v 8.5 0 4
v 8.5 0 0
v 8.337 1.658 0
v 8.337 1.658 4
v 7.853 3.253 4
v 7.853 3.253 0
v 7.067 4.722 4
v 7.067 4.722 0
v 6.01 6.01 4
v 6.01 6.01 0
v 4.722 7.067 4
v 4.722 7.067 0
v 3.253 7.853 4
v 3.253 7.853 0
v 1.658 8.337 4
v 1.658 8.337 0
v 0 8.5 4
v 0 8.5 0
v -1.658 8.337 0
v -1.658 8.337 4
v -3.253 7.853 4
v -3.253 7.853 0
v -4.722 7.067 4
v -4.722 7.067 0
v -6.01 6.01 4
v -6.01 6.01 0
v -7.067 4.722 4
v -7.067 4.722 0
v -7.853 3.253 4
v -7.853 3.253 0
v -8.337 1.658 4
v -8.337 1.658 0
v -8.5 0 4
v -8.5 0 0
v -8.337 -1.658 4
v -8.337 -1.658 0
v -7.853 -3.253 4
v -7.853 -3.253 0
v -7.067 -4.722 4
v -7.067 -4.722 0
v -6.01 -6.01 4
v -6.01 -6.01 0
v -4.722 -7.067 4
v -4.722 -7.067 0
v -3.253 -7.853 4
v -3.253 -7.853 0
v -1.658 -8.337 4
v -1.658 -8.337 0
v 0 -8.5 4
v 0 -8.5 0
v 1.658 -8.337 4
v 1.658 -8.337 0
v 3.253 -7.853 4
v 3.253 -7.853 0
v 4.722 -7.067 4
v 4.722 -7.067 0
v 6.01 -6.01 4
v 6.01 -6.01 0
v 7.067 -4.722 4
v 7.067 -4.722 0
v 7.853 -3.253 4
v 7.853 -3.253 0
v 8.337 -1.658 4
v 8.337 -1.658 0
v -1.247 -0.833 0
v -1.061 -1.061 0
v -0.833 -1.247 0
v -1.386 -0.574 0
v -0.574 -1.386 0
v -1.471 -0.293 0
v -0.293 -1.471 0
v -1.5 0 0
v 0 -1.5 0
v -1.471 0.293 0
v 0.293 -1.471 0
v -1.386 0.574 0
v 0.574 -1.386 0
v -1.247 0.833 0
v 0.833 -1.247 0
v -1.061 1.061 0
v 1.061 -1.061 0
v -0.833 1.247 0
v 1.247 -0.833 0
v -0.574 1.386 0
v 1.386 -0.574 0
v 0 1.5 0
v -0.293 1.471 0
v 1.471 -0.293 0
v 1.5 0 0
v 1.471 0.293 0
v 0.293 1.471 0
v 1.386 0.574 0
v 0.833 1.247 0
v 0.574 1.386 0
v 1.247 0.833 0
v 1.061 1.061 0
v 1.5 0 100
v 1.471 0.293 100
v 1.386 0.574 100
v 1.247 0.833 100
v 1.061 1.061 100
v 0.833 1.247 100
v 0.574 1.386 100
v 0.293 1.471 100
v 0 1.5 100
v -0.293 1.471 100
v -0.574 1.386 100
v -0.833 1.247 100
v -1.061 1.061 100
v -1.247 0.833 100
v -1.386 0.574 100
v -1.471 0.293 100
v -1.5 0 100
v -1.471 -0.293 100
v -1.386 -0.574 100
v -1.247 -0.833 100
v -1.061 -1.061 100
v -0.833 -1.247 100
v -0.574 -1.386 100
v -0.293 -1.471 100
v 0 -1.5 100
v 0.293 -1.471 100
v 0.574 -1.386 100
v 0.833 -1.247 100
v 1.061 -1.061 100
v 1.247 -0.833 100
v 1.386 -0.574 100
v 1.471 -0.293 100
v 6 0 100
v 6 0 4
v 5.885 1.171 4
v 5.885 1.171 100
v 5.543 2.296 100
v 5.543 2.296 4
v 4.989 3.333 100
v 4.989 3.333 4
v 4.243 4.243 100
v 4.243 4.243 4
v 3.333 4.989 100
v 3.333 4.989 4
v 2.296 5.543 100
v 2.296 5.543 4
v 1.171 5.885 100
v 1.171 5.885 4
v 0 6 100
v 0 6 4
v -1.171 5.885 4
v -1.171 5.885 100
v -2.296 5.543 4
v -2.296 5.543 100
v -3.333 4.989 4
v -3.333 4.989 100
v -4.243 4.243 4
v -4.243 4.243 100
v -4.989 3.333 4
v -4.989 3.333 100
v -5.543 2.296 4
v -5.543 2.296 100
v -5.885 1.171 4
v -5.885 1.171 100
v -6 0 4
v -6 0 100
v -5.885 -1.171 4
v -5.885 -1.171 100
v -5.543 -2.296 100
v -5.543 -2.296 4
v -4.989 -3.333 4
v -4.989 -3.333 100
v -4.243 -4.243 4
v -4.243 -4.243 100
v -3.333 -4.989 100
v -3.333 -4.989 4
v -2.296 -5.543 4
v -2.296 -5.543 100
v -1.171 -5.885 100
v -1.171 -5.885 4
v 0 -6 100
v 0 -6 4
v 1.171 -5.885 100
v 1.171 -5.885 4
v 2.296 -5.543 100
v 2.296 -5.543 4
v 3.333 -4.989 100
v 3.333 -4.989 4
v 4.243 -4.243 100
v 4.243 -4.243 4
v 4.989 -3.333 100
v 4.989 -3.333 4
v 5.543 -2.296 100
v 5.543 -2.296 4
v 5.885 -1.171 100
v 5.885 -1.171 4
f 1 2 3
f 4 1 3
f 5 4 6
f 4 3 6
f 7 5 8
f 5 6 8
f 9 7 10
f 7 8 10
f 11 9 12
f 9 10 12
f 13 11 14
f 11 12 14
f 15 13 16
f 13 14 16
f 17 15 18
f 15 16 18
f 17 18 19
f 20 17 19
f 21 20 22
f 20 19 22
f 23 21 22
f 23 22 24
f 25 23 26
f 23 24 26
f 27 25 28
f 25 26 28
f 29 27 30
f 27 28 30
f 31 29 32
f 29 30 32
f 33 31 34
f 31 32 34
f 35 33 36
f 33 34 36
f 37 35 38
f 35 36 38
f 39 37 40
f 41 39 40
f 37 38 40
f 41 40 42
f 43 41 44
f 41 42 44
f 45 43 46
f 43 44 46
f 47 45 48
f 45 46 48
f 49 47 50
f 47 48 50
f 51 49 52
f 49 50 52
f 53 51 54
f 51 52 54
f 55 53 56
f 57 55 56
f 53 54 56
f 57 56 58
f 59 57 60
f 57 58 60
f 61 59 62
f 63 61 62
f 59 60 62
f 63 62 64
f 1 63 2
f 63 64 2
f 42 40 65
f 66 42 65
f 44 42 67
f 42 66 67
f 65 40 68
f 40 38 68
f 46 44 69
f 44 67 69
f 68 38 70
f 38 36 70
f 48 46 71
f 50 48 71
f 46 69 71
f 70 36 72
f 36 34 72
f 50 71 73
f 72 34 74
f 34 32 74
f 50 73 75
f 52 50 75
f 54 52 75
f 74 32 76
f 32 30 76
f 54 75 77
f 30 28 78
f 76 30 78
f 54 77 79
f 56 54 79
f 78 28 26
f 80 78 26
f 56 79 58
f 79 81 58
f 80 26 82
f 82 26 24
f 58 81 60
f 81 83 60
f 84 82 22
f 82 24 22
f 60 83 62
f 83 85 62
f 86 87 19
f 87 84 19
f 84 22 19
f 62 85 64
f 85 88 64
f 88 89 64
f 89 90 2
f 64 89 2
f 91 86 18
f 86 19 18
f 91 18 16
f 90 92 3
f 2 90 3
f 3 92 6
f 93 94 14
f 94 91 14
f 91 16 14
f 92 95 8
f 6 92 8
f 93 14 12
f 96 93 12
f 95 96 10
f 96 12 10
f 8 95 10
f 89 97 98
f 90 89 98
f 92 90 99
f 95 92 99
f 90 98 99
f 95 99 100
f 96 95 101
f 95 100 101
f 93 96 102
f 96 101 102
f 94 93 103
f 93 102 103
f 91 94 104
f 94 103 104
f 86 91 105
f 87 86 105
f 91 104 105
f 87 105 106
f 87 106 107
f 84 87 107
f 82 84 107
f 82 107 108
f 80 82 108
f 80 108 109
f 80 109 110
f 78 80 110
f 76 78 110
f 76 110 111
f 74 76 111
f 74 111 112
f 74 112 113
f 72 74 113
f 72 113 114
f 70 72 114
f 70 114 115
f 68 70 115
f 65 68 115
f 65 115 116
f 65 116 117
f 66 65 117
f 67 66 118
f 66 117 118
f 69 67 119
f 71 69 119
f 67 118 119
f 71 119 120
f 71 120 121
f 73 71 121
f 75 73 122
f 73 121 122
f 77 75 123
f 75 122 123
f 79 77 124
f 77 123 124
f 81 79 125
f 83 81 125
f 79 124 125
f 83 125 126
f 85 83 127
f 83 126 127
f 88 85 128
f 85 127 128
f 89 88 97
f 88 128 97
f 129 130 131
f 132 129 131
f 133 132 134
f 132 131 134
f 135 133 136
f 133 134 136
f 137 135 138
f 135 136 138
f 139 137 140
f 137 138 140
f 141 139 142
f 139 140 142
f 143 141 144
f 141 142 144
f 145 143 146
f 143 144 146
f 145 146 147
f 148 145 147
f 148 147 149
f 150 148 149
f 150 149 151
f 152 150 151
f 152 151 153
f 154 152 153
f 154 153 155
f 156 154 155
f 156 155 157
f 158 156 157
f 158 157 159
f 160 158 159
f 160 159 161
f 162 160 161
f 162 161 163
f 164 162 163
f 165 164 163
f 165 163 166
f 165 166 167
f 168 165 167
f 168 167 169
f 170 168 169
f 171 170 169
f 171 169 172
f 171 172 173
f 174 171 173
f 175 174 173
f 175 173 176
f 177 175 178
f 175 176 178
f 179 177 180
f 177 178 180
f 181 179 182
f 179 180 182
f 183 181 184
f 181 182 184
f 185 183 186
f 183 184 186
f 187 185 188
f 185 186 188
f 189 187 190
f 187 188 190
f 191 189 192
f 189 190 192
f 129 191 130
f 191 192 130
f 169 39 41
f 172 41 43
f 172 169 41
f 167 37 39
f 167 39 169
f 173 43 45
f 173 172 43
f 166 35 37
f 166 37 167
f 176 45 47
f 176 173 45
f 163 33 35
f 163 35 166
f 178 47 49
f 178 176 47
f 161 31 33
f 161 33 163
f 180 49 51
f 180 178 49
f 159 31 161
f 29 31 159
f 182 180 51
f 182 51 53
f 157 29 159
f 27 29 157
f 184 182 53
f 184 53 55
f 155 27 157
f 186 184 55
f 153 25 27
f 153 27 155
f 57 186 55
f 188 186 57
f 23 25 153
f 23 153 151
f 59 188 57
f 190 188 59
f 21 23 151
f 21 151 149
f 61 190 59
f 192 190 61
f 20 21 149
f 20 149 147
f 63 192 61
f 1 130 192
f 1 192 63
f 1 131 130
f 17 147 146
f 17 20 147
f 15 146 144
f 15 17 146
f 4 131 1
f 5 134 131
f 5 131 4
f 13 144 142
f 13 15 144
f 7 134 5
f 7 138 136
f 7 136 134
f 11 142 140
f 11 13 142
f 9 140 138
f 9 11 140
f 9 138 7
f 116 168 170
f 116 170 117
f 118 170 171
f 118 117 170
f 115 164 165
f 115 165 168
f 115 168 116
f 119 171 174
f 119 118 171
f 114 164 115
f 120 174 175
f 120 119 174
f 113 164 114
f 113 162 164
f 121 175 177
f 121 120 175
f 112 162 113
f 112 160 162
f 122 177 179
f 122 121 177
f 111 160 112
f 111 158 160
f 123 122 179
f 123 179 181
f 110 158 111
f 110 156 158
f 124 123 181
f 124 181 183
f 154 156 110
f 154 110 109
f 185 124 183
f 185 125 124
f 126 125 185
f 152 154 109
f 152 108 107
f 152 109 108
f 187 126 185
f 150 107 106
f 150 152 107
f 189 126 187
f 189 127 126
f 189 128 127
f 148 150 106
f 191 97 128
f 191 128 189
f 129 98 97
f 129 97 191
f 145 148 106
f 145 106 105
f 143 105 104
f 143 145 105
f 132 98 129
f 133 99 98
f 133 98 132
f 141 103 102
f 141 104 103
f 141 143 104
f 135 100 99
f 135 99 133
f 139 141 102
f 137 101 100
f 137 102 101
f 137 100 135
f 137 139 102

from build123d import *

# Parameters (mm, degrees)
F0_R     = 8.5
F1_DEPTH = 4
F2_R     = 6
F3_DEPTH = 100
F4_R     = 1.5
F5_DEPTH = 114.9


with BuildPart() as f1:
    # F0 (on Top) → F1 (new body)
    with BuildSketch(Plane.XY):
        Circle(F0_R)
    extrude(amount=F1_DEPTH)

    # F2 (on Top) → F3 (join)
    with BuildSketch(Plane.XY):
        Circle(F2_R)
    extrude(amount=F3_DEPTH)

    # F4 (on face) → F5 (cut)
    with BuildSketch(Plane.XY.offset(100)):
        Circle(F4_R)
    extrude(amount=-F5_DEPTH, mode=Mode.SUBTRACT)


solid = f1.part
